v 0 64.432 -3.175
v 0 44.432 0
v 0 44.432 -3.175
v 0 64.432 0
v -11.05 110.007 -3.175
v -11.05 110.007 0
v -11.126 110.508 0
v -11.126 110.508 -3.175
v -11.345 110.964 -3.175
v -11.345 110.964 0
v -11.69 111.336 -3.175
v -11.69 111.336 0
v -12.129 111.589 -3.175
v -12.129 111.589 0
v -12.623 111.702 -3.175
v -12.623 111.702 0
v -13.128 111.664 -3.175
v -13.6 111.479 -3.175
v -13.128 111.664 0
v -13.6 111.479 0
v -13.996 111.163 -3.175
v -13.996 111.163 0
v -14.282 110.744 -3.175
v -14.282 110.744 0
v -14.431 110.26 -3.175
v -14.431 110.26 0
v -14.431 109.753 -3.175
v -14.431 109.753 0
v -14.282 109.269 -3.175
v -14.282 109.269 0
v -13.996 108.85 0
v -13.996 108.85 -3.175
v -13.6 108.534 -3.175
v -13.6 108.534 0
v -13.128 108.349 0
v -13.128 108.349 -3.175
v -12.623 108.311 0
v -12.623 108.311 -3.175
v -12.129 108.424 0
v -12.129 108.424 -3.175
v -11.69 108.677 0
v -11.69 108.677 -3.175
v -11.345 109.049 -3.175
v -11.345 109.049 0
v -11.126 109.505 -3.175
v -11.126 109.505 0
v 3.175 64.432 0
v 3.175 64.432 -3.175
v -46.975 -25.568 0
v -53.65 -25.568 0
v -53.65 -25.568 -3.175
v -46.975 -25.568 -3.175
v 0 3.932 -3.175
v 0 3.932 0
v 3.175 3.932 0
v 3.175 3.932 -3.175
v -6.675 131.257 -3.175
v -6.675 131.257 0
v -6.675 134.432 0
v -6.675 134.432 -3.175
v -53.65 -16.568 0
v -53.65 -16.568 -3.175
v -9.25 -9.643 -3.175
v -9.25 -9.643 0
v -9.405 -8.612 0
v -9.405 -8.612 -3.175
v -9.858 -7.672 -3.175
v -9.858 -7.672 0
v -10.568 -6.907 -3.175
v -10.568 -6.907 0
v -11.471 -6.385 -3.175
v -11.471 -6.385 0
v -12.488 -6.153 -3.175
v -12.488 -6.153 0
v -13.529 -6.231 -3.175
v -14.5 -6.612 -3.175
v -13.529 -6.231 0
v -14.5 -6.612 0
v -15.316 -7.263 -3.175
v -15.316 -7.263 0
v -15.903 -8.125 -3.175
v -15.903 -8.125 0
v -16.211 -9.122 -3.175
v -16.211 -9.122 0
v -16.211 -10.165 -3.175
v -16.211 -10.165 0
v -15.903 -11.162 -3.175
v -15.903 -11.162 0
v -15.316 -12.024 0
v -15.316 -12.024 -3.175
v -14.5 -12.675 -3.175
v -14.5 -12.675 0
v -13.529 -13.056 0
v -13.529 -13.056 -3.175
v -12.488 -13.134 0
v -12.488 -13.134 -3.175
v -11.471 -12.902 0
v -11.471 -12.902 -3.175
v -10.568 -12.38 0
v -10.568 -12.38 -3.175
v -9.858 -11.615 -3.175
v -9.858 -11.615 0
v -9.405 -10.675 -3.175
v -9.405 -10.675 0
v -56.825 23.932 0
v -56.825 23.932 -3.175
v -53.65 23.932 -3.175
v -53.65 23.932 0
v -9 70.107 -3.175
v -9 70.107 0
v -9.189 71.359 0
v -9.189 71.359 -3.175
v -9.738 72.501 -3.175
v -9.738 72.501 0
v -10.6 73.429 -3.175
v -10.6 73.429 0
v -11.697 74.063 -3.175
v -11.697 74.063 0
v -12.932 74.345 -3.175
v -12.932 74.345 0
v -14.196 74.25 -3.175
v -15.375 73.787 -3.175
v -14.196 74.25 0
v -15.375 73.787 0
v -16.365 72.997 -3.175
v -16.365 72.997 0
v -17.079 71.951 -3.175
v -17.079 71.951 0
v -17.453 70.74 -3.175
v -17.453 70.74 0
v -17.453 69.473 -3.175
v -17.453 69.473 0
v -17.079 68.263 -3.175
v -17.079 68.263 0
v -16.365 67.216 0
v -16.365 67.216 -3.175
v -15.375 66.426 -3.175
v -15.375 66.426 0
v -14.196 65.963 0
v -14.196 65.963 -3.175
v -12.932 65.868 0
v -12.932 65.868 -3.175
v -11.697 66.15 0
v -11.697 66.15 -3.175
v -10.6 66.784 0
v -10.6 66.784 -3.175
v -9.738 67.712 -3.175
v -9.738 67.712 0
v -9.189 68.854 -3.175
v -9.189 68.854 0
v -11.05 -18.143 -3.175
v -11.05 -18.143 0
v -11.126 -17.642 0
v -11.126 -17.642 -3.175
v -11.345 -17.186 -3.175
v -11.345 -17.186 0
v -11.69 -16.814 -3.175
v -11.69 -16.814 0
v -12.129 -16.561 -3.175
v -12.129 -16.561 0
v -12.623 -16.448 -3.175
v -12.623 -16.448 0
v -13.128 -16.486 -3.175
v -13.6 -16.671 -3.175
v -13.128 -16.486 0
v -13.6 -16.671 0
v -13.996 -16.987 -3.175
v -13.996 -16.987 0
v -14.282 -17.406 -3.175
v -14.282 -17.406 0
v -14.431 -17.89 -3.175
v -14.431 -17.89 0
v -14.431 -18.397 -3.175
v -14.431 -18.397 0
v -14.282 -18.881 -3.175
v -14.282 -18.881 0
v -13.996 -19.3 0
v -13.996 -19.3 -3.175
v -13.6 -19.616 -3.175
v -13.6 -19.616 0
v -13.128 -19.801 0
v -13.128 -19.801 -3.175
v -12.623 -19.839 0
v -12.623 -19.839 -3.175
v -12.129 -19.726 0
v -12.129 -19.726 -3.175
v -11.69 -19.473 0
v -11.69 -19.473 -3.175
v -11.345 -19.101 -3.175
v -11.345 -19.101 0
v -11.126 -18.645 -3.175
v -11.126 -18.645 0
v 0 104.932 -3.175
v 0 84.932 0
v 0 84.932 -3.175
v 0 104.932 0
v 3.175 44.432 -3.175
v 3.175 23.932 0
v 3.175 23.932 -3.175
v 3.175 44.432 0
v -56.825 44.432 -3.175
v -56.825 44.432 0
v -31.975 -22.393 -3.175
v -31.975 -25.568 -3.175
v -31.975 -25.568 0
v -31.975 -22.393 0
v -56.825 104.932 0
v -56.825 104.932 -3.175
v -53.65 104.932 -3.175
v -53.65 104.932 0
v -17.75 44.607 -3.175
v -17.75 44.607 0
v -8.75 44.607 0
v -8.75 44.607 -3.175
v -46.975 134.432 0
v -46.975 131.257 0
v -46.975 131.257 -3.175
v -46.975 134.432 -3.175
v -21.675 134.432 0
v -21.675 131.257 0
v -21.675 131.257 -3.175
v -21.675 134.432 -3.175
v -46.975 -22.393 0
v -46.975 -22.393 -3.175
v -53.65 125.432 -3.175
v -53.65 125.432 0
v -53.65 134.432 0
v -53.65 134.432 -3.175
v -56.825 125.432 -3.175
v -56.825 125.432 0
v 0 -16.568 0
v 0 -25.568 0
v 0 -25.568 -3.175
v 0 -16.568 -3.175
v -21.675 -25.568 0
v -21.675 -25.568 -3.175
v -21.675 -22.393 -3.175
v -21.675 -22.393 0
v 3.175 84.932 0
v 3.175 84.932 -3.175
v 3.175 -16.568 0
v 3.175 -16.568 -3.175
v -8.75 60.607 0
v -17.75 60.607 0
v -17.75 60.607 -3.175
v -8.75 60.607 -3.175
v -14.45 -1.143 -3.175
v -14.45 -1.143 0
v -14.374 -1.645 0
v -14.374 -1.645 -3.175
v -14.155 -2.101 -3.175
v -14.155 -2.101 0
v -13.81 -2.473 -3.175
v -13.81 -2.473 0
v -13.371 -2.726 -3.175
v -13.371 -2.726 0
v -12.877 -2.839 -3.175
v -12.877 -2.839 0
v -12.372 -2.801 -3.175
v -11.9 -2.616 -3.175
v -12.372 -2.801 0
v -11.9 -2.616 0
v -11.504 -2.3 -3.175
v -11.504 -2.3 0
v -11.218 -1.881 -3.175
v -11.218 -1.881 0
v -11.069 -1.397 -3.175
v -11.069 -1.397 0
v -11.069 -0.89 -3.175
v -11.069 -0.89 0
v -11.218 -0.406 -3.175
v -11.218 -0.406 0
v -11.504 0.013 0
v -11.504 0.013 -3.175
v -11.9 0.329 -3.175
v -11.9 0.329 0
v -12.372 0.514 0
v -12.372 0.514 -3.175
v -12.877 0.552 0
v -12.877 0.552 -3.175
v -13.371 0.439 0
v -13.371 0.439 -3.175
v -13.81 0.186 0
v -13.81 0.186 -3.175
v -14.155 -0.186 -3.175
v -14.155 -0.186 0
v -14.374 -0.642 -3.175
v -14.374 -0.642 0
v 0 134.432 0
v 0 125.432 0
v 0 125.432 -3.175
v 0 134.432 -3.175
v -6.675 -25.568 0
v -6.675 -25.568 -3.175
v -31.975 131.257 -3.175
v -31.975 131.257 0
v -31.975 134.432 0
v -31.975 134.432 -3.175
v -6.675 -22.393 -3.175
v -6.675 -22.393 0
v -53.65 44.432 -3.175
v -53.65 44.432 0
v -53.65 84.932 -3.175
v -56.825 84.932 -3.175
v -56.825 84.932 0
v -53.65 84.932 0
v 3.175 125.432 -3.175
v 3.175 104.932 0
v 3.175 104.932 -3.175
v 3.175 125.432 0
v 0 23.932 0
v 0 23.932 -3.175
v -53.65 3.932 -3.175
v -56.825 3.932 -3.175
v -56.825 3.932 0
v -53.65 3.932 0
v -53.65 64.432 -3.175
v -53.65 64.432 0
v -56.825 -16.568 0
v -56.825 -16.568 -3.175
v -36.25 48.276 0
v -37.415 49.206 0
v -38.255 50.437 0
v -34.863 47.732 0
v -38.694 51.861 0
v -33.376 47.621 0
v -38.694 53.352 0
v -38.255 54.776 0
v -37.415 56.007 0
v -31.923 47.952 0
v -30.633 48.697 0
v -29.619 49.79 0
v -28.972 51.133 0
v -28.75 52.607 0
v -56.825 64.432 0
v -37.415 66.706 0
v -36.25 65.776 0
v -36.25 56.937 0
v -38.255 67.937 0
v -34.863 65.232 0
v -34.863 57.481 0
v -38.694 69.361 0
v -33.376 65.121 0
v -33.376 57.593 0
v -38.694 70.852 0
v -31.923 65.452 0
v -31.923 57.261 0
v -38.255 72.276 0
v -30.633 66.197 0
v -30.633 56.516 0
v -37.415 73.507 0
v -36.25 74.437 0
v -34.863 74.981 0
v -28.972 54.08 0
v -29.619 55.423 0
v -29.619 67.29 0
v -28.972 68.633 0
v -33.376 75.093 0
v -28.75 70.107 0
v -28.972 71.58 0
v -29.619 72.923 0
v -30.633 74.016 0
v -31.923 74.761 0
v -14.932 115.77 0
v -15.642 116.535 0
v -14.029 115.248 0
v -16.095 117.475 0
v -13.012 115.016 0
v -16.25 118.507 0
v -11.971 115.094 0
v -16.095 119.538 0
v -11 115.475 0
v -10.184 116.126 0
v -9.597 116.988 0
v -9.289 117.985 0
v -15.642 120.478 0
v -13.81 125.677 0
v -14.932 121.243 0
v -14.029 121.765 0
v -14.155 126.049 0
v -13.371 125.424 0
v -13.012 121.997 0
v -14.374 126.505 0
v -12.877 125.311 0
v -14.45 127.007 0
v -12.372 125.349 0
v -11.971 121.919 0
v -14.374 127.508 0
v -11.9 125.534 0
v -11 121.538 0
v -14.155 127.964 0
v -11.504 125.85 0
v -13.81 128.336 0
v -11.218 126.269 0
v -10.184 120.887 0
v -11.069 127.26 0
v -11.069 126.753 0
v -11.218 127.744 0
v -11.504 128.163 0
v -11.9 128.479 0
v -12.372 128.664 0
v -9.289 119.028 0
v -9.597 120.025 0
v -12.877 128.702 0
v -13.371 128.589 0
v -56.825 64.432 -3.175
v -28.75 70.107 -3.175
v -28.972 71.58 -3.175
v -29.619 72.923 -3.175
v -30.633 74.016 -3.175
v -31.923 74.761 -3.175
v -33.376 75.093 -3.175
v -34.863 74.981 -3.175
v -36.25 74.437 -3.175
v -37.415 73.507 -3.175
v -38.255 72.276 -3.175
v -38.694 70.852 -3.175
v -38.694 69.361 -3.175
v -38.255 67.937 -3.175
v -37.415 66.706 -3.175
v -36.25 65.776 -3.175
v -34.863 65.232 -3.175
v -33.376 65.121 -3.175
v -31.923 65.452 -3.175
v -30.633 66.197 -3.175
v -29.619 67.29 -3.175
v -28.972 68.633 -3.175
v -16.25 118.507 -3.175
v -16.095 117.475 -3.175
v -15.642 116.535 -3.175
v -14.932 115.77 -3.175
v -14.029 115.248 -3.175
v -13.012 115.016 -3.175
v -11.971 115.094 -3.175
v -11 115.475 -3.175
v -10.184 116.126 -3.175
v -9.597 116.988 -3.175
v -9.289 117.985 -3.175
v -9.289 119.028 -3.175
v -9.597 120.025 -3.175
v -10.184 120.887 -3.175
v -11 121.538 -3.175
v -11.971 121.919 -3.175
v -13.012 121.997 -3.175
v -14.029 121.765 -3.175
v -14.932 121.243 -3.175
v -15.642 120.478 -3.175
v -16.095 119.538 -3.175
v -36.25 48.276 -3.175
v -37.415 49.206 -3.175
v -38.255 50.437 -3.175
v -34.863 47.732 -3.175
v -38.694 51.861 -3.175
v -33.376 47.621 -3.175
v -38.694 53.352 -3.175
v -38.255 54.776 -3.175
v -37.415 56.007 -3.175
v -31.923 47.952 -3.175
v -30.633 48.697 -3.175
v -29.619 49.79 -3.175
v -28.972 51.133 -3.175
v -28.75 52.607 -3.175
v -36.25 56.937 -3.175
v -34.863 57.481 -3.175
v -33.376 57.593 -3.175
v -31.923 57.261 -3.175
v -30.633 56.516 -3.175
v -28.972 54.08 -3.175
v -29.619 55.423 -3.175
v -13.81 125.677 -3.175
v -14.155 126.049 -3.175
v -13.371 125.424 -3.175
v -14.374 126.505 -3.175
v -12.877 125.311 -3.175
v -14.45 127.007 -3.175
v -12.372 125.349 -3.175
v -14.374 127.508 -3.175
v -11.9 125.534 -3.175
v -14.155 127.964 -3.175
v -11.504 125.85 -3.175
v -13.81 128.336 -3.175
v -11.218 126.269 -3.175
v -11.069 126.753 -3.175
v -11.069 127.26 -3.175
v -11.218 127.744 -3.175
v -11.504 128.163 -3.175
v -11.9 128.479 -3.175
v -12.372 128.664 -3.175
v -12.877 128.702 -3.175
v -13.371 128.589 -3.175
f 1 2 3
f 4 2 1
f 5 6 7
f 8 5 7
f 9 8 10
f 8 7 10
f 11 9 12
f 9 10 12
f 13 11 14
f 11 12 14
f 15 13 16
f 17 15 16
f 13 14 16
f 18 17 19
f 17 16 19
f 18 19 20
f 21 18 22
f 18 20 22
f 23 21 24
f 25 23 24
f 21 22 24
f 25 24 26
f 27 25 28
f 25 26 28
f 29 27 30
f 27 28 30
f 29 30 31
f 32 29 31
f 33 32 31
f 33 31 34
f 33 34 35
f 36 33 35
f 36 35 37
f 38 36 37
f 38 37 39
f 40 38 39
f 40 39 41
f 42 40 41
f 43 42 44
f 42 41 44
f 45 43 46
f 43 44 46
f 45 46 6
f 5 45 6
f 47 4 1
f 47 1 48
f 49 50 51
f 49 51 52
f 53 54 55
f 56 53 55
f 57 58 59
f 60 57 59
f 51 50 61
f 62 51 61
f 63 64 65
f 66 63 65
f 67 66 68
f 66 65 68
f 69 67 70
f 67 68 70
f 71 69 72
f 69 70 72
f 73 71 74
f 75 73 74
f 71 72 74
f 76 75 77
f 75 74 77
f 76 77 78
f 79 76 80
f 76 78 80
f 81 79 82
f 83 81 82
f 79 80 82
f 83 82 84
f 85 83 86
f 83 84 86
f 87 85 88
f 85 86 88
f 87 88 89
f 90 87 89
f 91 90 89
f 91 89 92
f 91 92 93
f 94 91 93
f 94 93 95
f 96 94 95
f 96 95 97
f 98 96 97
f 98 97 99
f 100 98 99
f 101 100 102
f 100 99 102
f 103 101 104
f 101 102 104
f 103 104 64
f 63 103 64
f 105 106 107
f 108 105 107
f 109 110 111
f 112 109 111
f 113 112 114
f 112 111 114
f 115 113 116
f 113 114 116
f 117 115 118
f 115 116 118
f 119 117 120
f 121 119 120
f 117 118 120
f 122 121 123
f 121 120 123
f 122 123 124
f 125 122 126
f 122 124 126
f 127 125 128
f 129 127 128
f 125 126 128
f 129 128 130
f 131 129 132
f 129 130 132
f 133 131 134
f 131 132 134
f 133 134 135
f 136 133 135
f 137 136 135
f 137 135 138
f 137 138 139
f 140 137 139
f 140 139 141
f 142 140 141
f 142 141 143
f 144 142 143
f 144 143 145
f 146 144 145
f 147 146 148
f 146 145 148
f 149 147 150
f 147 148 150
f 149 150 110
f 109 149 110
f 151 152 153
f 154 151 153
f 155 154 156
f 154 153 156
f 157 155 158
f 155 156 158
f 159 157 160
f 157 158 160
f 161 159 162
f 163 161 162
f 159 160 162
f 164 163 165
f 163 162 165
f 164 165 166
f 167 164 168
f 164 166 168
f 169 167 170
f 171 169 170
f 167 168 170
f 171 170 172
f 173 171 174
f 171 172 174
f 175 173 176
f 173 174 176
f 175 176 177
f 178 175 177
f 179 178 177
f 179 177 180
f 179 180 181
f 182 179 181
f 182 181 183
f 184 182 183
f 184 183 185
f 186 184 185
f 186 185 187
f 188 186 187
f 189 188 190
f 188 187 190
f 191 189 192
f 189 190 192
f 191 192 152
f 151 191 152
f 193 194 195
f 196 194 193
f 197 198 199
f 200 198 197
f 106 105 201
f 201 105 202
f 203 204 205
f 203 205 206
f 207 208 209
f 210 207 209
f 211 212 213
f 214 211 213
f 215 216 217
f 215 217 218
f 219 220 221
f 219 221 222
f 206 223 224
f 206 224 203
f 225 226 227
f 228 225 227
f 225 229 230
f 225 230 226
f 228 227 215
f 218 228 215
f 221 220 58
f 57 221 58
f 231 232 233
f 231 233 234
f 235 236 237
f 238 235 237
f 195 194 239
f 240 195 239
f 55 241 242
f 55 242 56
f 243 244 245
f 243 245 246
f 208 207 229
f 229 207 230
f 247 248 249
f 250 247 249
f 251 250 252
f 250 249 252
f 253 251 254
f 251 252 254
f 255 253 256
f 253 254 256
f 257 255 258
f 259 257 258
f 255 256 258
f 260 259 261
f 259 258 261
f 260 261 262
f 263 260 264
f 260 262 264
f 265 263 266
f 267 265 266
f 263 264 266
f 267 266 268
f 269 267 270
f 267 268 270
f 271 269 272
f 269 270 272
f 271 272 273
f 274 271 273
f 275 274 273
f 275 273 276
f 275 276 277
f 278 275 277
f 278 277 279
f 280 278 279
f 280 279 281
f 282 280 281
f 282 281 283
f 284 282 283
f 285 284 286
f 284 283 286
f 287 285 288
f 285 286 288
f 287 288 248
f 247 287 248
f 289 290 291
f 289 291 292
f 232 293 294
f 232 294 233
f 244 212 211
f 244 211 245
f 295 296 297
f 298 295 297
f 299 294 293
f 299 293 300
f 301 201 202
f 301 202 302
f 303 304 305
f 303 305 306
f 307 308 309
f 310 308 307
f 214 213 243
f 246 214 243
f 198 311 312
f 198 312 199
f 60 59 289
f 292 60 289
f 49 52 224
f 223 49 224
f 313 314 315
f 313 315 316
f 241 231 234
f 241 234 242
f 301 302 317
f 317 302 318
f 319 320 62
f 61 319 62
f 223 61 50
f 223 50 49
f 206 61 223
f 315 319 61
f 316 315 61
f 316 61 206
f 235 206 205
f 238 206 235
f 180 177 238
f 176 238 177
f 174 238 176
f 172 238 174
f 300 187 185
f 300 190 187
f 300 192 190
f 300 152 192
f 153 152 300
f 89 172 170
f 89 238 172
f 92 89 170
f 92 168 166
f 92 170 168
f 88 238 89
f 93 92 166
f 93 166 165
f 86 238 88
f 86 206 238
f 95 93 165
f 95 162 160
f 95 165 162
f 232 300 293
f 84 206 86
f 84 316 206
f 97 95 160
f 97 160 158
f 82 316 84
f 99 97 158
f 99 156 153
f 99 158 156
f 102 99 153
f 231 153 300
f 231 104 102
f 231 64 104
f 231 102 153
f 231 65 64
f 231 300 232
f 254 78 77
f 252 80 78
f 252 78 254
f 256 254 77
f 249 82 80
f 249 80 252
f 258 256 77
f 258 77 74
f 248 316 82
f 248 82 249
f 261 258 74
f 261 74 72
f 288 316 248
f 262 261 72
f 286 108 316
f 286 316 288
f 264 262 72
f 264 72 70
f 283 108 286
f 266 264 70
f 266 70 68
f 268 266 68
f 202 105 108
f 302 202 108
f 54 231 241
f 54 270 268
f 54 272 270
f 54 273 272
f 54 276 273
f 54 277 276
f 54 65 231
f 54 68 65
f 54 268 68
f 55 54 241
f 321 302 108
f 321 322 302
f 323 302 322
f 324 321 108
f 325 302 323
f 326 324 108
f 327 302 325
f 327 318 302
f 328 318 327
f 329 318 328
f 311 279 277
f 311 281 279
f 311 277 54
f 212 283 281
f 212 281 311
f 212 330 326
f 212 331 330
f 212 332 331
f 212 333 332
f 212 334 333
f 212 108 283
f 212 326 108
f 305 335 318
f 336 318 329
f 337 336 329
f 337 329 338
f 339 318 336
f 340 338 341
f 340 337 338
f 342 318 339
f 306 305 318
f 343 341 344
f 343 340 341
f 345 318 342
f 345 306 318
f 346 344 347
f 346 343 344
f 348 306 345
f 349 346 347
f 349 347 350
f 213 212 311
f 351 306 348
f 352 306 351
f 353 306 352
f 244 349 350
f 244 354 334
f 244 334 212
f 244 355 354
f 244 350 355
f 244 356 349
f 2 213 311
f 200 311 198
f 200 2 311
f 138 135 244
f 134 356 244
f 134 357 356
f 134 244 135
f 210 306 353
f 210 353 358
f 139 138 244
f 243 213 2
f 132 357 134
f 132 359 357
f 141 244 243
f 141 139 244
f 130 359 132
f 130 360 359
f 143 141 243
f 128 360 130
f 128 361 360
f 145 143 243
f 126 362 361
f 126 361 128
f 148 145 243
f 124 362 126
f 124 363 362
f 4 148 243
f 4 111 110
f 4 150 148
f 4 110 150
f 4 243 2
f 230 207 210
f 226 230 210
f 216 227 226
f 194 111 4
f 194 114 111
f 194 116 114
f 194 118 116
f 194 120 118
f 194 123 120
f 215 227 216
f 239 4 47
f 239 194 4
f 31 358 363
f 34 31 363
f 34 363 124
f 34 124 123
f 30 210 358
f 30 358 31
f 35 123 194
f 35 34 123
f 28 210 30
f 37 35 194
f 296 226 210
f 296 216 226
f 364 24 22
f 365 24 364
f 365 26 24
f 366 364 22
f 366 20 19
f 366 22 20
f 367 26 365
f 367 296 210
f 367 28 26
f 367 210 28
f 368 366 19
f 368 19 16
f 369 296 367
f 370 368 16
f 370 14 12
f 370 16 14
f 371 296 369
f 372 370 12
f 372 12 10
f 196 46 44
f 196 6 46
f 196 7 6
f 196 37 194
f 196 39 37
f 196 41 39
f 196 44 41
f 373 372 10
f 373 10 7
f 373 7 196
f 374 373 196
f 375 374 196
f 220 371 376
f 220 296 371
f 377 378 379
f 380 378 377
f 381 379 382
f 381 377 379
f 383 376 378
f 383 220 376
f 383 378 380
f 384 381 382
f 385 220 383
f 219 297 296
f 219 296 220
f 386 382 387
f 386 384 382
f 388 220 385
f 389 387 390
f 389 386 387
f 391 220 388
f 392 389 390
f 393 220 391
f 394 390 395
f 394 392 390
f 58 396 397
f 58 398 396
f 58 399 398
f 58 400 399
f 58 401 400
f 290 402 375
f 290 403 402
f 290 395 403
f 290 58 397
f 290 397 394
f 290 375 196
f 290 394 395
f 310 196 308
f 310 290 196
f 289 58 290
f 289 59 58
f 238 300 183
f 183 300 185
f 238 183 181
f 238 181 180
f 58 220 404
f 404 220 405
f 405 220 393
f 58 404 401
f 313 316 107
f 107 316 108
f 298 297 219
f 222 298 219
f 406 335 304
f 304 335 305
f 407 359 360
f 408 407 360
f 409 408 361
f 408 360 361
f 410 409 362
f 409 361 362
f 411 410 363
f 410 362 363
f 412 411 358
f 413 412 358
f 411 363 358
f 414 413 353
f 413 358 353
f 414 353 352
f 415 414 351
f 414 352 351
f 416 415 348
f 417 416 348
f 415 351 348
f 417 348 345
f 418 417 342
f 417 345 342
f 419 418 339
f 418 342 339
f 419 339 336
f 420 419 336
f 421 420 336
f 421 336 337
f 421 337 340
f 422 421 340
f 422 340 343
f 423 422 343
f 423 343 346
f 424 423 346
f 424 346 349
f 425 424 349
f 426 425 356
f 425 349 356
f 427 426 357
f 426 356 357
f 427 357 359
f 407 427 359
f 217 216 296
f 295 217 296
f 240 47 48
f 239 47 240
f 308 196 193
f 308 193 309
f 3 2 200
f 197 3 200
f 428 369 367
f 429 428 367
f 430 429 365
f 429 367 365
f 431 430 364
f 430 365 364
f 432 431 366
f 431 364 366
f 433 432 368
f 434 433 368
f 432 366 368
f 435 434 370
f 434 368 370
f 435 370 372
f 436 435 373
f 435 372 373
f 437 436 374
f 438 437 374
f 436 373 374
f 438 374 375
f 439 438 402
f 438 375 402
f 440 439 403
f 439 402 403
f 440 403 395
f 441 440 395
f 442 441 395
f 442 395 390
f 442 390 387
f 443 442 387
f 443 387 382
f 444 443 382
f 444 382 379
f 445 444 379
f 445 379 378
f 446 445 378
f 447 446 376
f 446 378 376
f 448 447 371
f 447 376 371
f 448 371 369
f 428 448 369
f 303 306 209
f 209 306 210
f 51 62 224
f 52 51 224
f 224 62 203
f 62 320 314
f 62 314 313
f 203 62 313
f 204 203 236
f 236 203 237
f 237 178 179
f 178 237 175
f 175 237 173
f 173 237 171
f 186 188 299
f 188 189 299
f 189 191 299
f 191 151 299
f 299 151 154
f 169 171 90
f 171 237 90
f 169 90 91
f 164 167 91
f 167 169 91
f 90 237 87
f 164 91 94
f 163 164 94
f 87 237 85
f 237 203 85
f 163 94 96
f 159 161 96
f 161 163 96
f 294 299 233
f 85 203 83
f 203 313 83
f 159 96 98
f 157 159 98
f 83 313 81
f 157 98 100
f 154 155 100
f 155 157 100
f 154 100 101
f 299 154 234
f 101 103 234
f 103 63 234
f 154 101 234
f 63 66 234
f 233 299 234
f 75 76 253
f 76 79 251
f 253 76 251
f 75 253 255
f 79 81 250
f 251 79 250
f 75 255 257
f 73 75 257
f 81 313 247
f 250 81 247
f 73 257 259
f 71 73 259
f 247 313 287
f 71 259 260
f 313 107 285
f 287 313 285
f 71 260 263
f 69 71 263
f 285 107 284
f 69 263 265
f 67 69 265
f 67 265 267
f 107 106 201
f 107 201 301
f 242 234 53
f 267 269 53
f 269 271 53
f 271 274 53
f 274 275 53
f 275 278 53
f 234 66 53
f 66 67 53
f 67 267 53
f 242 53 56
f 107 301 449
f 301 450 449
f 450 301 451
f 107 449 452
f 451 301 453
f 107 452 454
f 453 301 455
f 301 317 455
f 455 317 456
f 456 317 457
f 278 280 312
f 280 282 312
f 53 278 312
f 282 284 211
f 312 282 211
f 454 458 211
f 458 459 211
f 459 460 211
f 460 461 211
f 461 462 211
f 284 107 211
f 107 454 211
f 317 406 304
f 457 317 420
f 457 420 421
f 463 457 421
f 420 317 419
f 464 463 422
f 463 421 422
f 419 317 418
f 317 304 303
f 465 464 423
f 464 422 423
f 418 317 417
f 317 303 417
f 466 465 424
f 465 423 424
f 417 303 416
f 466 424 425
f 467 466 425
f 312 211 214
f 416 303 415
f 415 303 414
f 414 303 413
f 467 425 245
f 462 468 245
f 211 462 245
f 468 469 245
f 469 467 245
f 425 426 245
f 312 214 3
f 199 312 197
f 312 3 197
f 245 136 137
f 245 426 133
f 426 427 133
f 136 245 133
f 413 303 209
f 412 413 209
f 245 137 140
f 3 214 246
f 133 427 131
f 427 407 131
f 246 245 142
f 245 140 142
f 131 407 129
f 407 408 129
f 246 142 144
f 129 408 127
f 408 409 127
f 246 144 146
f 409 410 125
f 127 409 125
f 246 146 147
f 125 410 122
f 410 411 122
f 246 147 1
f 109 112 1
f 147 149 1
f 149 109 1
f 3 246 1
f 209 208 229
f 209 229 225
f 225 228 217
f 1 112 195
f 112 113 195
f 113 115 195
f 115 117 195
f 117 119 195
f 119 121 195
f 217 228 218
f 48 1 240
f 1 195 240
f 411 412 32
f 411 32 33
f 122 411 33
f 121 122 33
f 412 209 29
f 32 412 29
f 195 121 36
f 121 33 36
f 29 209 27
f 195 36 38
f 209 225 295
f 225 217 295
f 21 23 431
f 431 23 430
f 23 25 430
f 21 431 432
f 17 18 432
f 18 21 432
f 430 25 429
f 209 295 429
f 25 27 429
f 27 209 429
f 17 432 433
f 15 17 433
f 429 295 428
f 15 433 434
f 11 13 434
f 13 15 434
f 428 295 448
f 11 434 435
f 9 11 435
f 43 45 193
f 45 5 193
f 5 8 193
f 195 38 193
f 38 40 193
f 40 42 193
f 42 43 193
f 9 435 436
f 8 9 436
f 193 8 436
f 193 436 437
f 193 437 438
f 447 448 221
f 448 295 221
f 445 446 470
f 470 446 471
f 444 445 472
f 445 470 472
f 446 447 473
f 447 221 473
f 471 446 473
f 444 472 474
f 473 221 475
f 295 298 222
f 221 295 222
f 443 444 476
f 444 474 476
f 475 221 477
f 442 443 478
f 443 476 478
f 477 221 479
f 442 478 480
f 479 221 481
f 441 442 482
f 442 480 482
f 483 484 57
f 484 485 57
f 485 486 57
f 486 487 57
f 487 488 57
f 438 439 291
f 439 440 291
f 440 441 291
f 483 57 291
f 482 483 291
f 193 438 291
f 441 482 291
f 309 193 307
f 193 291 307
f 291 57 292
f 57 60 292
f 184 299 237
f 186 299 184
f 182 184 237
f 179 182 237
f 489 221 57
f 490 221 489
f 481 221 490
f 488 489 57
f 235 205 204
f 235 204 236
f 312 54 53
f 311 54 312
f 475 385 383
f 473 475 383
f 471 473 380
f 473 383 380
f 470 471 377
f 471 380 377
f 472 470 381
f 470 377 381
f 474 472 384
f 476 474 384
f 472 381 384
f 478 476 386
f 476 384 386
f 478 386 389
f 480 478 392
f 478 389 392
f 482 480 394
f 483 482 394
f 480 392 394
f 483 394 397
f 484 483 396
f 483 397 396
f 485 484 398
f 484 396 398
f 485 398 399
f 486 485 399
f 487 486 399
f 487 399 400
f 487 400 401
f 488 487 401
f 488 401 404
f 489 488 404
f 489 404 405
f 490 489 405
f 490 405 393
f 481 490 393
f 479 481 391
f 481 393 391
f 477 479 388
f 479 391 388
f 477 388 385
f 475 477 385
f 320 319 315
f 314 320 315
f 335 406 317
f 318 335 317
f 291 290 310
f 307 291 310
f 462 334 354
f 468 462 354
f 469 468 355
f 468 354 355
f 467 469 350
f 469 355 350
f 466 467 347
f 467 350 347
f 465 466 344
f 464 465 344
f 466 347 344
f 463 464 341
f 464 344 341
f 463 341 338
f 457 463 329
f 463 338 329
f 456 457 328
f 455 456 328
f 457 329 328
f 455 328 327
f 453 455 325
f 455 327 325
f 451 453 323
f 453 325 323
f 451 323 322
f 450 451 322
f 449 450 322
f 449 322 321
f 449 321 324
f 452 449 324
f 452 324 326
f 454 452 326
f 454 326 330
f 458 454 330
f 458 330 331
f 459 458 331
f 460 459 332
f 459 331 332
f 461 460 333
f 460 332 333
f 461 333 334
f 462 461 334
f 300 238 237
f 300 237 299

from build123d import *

# Parameters (mm, degrees)
SKETCH1_W           = 60
SKETCH1_H           = 160
BOSS_EXTRUDE1_DEPTH = 3.175
SKETCH4_W           = 3.175
SKETCH4_H           = 9
SKETCH4_H_2         = 20
SKETCH4_W_2         = 15
SKETCH4_H_3         = 3.175
CUT_EXTRUDE2_DEPTH  = 3.175
SKETCH5_R           = 3.5
SKETCH5_R_2         = 1.7
CUT_EXTRUDE3_DEPTH  = 3.175
SKETCH6_R           = 5
SKETCH6_R_2         = 4.25
SKETCH6_W           = 9
SKETCH6_H           = 16
CUT_EXTRUDE4_DEPTH  = 3.175


with BuildPart() as part:
    # Sketch1 → Boss-Extrude1 (new body)
    with BuildSketch(Plane.XY):
        with Locations((-26.825, 54.431521206)):
            Rectangle(SKETCH1_W, SKETCH1_H)
    extrude(amount=-BOSS_EXTRUDE1_DEPTH)

    # Sketch4 → Cut-Extrude2 (cut)
    with BuildSketch(Plane.XY):
        with Locations((1.5875, -21.068478794)):
            Rectangle(SKETCH4_W, SKETCH4_H)
        with Locations((1.5875, 13.931521206)):
            Rectangle(SKETCH4_W, SKETCH4_H_2)
        with Locations((1.5875, 54.431521206)):
            Rectangle(SKETCH4_W, SKETCH4_H_2)
        with Locations((1.5875, 94.931521206)):
            Rectangle(SKETCH4_W, SKETCH4_H_2)
        with Locations((1.5875, 129.931521206)):
            Rectangle(SKETCH4_W, SKETCH4_H)
        with Locations((-39.475, -23.980978794)):
            Rectangle(SKETCH4_W_2, SKETCH4_H_3)
        with Locations((-55.2375, 13.931521206)):
            Rectangle(SKETCH4_W, SKETCH4_H_2)
        with Locations((-55.2375, 54.431521206)):
            Rectangle(SKETCH4_W, SKETCH4_H_2)
        with Locations((-55.2375, 94.931521206)):
            Rectangle(SKETCH4_W, SKETCH4_H_2)
        with Locations((-55.2375, 129.931521206)):
            Rectangle(SKETCH4_W, SKETCH4_H)
        with Locations((-55.2375, -21.068478794)):
            Rectangle(SKETCH4_W, SKETCH4_H)
        with Locations((-14.175, -23.980978794)):
            Rectangle(SKETCH4_W_2, SKETCH4_H_3)
        with Locations((-14.175, 132.844021206)):
            Rectangle(SKETCH4_W_2, SKETCH4_H_3)
        with Locations((-39.475, 132.844021206)):
            Rectangle(SKETCH4_W_2, SKETCH4_H_3)
    extrude(amount=-CUT_EXTRUDE2_DEPTH, mode=Mode.SUBTRACT)

    # Sketch5 → Cut-Extrude3 (cut)
    with BuildSketch(Plane.XY):
        with Locations((-12.75, -9.643478794)):
            Circle(SKETCH5_R)
        with Locations((-12.75, -18.143478794)):
            Circle(SKETCH5_R_2)
        with Locations(Location((-12.75, -1.143478794, 0), (0, 0, 180))):
            Circle(SKETCH5_R_2)
        with Locations(Location((-12.75, 127.006521206, 0), (0, 0, 180))):
            Circle(SKETCH5_R_2)
        with Locations(Location((-12.75, 118.506521206, 0), (0, 0, 180))):
            Circle(SKETCH5_R)
        with Locations((-12.75, 110.006521206)):
            Circle(SKETCH5_R_2)
    extrude(amount=-CUT_EXTRUDE3_DEPTH, mode=Mode.SUBTRACT)

    # Sketch6 → Cut-Extrude4 (cut)
    with BuildSketch(Plane.XY):
        with Locations((-33.75, 52.606521206)):
            Circle(SKETCH6_R)
        with Locations((-13.25, 70.106521206)):
            Circle(SKETCH6_R_2)
        with Locations((-33.75, 70.106521206)):
            Circle(SKETCH6_R)
        with Locations((-13.25, 52.606521206)):
            Rectangle(SKETCH6_W, SKETCH6_H)
    extrude(amount=-CUT_EXTRUDE4_DEPTH, mode=Mode.SUBTRACT)


solid = part.part
